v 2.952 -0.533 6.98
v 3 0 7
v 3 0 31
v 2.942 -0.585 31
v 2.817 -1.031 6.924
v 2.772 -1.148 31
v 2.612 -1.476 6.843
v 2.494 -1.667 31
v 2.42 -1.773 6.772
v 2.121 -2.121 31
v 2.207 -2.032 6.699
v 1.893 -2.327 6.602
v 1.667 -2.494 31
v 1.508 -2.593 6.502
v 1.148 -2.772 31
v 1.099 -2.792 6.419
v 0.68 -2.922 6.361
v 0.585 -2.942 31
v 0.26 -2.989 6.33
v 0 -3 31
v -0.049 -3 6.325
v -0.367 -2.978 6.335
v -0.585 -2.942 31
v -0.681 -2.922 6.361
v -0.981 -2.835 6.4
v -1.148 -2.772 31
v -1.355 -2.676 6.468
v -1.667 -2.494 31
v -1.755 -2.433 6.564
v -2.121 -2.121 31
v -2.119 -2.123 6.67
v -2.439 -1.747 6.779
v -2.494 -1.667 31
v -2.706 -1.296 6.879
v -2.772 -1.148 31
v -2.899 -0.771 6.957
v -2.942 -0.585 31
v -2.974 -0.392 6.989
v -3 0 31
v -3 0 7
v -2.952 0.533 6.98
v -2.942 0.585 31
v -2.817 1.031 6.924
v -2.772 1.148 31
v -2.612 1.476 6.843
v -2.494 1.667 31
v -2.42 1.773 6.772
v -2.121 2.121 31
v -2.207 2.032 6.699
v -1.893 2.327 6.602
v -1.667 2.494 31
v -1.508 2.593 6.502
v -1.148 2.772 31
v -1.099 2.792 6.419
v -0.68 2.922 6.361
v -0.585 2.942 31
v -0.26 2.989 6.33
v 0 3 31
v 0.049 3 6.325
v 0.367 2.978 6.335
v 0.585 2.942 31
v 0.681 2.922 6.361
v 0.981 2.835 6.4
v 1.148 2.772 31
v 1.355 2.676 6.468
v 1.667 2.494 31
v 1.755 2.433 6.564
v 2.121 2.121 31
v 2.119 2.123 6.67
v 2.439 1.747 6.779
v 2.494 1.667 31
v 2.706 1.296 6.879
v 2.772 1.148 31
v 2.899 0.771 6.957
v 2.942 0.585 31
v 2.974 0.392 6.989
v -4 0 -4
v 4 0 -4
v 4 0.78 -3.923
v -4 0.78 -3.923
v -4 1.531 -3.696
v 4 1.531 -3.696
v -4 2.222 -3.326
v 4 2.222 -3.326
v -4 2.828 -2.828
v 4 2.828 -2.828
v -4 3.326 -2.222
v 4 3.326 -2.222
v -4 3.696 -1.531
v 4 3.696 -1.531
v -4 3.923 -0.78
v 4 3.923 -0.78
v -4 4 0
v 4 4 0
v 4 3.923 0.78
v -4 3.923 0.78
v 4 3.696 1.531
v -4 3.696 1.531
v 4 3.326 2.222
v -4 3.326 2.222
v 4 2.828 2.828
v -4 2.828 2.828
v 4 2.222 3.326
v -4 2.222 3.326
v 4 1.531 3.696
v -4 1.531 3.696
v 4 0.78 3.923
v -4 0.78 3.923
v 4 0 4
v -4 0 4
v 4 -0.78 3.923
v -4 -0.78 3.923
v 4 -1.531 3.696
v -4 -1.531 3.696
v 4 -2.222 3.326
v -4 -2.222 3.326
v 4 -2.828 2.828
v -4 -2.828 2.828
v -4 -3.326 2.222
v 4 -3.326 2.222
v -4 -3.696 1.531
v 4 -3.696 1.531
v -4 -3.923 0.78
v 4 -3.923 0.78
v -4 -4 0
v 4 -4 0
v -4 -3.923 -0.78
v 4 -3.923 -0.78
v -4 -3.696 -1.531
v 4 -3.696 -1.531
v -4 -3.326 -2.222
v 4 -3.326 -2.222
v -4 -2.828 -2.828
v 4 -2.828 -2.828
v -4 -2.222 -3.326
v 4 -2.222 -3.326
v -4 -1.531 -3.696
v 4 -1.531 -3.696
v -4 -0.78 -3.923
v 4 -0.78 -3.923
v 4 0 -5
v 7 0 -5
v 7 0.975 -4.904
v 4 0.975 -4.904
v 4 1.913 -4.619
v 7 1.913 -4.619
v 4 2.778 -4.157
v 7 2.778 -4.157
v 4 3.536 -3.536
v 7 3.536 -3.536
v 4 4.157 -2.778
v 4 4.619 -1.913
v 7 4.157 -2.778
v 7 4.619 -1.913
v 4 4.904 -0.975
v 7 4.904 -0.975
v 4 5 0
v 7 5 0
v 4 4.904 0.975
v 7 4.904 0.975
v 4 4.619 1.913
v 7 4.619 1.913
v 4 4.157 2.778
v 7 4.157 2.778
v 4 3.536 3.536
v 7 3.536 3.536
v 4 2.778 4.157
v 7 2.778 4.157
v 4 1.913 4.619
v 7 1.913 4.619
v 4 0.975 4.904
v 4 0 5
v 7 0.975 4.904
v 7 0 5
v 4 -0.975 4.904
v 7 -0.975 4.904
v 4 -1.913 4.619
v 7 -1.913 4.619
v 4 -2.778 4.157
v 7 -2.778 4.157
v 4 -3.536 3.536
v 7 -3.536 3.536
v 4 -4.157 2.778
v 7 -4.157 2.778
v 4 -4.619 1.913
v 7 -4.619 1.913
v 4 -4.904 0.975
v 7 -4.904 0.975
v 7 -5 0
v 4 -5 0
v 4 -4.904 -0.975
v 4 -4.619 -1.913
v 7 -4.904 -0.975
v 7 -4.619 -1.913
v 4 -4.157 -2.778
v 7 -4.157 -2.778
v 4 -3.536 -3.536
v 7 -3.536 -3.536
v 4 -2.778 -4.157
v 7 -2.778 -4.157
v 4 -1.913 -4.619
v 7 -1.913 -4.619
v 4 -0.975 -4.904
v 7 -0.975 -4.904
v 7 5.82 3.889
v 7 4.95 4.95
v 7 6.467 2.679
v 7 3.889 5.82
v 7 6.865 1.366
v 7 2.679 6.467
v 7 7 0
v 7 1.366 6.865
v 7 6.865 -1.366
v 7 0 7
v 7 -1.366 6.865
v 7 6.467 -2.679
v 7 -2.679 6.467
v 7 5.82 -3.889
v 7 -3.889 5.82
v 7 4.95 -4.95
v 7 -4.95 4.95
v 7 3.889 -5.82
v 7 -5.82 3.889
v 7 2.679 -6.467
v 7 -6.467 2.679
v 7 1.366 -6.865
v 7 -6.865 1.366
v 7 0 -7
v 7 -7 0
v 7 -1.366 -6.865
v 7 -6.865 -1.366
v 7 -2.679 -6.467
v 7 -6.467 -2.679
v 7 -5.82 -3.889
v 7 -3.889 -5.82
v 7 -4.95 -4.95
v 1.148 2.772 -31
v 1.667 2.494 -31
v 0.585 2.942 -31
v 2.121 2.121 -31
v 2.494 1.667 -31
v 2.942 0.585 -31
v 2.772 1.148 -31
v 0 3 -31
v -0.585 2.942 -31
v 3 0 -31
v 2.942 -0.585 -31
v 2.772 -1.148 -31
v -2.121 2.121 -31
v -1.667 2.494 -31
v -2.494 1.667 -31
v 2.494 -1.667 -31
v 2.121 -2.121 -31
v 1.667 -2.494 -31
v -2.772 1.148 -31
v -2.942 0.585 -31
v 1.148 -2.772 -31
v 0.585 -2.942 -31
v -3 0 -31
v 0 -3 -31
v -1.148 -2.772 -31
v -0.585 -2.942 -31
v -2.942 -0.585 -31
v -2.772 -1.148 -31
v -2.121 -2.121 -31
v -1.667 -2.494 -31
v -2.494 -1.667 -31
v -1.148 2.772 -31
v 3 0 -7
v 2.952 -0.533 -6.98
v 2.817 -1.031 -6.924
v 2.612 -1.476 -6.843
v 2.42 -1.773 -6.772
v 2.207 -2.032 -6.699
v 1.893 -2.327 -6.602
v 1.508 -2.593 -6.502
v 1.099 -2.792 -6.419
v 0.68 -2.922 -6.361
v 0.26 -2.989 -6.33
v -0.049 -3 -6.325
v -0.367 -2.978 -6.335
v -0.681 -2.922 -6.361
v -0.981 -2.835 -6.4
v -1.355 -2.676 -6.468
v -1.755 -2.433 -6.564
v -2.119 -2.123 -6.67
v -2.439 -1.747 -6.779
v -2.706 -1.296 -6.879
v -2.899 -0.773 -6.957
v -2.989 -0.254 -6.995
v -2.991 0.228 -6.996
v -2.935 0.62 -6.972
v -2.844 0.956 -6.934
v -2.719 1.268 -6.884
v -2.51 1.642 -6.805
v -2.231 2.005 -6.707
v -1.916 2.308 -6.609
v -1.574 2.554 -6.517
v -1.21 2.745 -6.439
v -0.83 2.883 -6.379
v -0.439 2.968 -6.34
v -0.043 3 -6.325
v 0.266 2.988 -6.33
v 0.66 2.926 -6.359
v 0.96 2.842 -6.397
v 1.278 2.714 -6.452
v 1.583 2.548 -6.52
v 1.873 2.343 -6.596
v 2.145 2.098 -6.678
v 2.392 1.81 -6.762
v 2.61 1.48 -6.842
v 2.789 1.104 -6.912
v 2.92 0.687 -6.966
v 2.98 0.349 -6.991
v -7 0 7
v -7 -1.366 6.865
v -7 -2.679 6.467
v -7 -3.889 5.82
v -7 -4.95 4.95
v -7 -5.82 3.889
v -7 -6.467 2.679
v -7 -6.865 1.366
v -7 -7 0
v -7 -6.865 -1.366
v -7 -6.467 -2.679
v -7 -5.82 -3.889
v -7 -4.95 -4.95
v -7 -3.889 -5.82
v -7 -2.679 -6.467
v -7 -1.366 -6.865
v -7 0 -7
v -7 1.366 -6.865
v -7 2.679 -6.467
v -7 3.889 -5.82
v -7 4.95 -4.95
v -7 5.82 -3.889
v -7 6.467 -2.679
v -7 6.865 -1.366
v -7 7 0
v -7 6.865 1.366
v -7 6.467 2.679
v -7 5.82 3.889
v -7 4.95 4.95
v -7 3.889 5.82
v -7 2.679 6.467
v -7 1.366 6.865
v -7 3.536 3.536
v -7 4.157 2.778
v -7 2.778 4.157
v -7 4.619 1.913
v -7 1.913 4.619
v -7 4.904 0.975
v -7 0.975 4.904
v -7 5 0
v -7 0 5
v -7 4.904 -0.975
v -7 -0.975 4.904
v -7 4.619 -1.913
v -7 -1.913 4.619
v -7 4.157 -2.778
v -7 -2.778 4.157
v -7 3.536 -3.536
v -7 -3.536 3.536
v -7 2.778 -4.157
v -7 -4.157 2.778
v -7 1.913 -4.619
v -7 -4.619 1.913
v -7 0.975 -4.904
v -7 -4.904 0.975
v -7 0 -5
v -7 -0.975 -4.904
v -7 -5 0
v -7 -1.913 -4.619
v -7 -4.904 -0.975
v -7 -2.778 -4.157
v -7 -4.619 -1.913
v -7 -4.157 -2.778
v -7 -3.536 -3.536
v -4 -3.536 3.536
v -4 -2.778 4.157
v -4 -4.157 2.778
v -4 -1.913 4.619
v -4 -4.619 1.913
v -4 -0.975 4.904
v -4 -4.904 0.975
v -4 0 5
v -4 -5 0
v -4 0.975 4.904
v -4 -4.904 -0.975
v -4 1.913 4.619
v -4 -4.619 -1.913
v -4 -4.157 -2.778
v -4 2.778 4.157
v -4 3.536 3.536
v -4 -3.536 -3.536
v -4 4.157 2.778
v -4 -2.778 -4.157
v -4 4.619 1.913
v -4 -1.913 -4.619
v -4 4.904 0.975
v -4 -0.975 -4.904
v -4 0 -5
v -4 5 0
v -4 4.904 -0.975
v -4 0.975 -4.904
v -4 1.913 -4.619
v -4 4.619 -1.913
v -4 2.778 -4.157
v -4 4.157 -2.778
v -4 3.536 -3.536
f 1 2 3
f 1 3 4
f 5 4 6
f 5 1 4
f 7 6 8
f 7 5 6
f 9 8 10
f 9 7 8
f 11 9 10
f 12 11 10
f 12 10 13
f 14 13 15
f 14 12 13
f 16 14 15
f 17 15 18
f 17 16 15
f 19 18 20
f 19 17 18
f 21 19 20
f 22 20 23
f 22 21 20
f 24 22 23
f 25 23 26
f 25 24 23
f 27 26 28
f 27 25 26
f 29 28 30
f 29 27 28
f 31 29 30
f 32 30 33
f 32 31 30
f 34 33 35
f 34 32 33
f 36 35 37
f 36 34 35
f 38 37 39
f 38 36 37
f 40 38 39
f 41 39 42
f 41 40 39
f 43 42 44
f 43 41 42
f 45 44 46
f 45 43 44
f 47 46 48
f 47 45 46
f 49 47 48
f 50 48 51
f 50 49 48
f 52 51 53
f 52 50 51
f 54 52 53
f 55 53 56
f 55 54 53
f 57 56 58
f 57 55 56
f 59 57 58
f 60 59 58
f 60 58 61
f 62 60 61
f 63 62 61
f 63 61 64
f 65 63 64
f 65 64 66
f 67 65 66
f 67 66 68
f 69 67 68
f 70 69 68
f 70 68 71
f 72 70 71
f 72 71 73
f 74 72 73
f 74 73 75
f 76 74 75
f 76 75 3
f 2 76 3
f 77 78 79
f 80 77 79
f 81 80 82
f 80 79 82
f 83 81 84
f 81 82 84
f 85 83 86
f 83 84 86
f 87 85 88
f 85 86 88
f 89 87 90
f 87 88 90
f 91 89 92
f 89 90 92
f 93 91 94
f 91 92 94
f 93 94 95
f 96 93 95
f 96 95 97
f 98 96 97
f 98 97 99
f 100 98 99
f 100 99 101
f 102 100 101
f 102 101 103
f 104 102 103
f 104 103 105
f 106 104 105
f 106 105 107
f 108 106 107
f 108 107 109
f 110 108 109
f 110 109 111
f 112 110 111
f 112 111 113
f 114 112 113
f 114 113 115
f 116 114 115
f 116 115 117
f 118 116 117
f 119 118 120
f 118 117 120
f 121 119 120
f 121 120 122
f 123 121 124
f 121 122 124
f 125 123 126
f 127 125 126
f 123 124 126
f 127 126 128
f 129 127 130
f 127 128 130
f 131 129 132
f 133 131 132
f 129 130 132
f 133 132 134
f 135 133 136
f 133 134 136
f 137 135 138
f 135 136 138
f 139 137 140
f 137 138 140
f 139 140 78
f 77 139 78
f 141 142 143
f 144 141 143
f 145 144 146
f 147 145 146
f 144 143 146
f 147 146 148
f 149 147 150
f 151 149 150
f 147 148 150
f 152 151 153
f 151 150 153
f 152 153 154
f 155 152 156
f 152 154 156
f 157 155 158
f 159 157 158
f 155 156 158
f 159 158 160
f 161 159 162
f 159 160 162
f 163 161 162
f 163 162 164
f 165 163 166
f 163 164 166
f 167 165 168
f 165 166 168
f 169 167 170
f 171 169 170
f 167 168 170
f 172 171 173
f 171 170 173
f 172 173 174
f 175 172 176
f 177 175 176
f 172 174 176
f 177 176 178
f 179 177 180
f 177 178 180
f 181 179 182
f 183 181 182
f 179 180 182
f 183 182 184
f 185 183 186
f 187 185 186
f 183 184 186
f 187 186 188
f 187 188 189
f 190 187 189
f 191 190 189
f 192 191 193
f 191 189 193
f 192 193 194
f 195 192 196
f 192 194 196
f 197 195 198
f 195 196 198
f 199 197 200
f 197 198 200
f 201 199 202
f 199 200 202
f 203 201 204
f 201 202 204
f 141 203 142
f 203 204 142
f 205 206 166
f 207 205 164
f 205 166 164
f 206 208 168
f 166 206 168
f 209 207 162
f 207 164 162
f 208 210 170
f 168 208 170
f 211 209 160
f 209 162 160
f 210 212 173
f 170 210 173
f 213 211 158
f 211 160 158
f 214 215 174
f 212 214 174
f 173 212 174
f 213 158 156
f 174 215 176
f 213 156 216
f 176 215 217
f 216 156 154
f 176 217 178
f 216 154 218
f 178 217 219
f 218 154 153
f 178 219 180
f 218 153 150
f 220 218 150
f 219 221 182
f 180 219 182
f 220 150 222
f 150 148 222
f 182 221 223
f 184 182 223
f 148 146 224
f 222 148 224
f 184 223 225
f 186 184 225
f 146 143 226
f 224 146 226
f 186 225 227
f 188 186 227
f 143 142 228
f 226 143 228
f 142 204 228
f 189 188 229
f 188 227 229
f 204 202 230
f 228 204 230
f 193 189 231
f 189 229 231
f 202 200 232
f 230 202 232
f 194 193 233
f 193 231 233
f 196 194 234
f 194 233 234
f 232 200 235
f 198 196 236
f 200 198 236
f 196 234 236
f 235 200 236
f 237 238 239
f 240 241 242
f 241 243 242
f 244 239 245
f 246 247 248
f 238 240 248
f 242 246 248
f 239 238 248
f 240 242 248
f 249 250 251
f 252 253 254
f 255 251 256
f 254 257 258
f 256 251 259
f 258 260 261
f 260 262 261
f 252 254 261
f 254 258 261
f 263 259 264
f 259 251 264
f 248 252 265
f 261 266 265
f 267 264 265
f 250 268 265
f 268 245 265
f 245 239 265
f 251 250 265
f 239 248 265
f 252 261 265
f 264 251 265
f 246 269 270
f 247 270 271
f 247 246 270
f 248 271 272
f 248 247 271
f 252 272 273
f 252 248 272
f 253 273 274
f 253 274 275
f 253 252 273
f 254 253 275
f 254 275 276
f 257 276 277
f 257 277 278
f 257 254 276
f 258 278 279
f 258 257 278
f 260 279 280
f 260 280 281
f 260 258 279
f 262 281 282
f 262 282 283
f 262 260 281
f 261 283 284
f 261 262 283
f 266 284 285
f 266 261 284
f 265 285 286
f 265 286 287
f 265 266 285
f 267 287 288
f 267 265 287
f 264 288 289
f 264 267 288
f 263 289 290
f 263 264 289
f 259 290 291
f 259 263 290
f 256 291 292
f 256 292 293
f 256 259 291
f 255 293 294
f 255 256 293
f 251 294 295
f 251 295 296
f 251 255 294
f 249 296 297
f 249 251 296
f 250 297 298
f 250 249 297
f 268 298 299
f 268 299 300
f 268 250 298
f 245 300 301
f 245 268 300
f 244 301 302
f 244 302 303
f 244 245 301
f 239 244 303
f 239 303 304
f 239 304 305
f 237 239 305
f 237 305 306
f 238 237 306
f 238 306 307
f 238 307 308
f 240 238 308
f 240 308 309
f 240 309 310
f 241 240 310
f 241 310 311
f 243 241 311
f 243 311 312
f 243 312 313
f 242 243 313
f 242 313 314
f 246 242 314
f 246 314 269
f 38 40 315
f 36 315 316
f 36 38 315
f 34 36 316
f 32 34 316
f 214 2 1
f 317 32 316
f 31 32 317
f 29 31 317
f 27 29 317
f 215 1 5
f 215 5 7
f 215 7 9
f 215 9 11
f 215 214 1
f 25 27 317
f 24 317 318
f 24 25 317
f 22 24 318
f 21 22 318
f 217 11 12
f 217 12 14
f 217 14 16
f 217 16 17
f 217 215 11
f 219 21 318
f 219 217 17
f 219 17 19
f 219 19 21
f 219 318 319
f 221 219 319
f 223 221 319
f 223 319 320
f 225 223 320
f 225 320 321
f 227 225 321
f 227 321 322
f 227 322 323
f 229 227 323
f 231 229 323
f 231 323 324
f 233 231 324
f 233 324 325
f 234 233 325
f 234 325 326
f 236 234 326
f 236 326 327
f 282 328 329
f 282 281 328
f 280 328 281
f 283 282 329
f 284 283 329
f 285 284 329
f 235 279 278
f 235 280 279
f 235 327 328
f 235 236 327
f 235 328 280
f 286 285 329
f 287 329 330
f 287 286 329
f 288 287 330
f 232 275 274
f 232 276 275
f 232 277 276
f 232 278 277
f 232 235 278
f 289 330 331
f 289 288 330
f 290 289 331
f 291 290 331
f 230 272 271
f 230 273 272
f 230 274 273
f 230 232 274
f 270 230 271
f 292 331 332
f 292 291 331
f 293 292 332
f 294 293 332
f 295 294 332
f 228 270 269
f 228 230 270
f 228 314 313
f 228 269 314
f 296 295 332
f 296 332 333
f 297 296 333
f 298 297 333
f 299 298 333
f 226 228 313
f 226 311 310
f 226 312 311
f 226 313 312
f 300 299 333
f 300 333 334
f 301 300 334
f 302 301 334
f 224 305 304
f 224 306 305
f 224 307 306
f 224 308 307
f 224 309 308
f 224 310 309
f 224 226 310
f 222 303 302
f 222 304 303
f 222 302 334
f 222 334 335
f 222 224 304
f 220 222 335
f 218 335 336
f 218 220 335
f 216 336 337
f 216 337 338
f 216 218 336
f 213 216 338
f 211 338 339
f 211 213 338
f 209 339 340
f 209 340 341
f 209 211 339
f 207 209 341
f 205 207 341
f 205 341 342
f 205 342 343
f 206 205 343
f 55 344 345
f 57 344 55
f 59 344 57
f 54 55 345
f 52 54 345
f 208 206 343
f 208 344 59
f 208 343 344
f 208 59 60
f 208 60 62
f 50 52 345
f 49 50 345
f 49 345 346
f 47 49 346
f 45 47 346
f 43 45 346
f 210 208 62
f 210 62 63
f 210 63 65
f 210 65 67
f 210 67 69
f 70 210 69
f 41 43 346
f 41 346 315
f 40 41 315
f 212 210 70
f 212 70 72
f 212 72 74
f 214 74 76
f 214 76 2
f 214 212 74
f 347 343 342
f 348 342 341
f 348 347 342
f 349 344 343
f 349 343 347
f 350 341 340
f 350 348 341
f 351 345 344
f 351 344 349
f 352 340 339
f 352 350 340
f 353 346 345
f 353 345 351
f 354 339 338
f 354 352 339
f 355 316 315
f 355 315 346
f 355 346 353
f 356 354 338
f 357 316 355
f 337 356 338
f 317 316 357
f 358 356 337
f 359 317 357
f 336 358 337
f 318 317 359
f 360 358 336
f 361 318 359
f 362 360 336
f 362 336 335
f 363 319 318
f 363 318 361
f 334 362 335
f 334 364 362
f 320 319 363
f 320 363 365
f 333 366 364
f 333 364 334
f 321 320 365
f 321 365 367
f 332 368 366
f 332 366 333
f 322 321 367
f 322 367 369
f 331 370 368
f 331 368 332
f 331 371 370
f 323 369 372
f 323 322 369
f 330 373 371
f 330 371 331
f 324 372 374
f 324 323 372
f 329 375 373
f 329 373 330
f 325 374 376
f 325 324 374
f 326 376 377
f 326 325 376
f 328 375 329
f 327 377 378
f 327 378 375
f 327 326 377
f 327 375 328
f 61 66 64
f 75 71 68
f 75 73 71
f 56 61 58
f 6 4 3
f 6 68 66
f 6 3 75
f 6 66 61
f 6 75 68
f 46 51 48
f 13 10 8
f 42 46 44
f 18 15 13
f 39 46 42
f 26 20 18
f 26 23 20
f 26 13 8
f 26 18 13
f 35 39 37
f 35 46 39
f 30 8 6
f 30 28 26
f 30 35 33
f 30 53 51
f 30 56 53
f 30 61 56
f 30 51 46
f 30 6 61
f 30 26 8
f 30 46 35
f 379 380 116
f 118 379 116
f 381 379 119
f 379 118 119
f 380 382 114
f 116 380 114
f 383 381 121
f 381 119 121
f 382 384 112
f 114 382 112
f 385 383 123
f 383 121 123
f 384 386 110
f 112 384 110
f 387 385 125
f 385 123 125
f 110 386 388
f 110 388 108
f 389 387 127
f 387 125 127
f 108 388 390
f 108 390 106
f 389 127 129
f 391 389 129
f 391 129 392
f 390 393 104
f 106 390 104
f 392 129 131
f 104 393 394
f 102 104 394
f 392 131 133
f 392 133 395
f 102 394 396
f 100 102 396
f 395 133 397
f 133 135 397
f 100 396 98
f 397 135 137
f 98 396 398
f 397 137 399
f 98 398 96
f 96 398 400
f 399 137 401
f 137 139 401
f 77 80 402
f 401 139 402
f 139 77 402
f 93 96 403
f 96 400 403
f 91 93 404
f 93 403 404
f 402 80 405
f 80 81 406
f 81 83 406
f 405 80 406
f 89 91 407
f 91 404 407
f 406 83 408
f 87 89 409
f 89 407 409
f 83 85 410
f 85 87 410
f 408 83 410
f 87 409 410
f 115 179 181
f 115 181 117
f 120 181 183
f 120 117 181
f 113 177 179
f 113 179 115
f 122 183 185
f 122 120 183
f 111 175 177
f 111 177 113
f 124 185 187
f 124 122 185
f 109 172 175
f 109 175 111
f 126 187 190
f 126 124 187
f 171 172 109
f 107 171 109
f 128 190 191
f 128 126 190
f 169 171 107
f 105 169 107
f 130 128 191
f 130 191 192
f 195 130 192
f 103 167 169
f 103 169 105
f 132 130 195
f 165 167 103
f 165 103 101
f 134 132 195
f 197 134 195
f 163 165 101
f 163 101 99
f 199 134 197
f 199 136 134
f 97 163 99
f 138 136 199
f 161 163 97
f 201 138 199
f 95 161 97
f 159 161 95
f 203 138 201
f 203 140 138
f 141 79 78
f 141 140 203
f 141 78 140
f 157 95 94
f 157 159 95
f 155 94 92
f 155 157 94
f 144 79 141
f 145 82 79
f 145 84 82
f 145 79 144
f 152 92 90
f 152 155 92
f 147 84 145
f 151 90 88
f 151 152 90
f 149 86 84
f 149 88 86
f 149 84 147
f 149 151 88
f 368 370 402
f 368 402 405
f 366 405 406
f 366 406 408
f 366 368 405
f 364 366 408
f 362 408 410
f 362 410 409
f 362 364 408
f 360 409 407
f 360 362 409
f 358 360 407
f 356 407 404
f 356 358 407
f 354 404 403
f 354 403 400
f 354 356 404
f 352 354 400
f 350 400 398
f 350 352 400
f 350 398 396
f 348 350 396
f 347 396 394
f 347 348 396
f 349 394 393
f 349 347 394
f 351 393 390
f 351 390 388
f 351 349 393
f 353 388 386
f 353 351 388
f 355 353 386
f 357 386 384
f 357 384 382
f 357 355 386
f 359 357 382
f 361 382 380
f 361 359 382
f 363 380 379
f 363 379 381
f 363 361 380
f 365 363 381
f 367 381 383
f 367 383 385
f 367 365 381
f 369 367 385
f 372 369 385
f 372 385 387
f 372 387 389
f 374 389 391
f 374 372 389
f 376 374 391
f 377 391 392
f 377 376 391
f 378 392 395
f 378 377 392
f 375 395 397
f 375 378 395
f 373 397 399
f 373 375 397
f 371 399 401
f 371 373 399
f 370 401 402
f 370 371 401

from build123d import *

# Parameters (mm, degrees)
SKETCH_1_W          = 14
SKETCH_1_H          = 7
SKETCH_2_W          = 62
SKETCH_2_H          = 3
SKETCH_3_R          = 4
CUT_EXTRUDE_1_DEPTH = 35.727510858
SKETCH_5_R          = 5
CUT_EXTRUDE_2_DEPTH = 3


with BuildPart() as part:
    # 草图1 → 旋转1 (revolve)
    with BuildSketch(Plane.XY, mode=Mode.PRIVATE) as revolve_1_sk:
        with Locations((0, 3.5)):
            Rectangle(SKETCH_1_W, SKETCH_1_H)
    revolve(revolve_1_sk.sketch.rotate(Axis((-7, 0, 0), (1, 0, 0)), 90), axis=Axis((-7, 0, 0), (1, 0, 0)))

    # 草图2 → 旋转3 (revolve)
    with BuildSketch(Plane(origin=(0, 0, 0), x_dir=(0, 0, -1), z_dir=(1, 0, 0)), mode=Mode.PRIVATE) as revolve_3_sk:
        with Locations((0, 1.5)):
            Rectangle(SKETCH_2_W, SKETCH_2_H)
    revolve(revolve_3_sk.sketch.rotate(Axis((0, 0, 31), (0, 0, -1)), 90), axis=Axis((0, 0, 31), (0, 0, -1)))

    # 草图3 → 切除-拉伸1 (cut, through all)
    with BuildSketch(Plane(origin=(7, 0, 0), x_dir=(0, 0, -1), z_dir=(1, 0, 0))):
        Circle(SKETCH_3_R)
    extrude(amount=-CUT_EXTRUDE_1_DEPTH, mode=Mode.SUBTRACT)

    # 草图5 → 切除-拉伸2 (cut)
    with BuildSketch(Plane(origin=(7, 0, 0), x_dir=(0, 0, -1), z_dir=(1, 0, 0))):
        Circle(SKETCH_5_R)
    cut_extrude_2 = extrude(amount=-CUT_EXTRUDE_2_DEPTH, mode=Mode.SUBTRACT)

    # 镜向1: 切除-拉伸2 across plane
    add(cut_extrude_2.mirror(Plane(origin=(0, 0, 0), x_dir=(0, 0, 1), z_dir=(1, 0, 0))), mode=Mode.SUBTRACT)


solid = part.part
